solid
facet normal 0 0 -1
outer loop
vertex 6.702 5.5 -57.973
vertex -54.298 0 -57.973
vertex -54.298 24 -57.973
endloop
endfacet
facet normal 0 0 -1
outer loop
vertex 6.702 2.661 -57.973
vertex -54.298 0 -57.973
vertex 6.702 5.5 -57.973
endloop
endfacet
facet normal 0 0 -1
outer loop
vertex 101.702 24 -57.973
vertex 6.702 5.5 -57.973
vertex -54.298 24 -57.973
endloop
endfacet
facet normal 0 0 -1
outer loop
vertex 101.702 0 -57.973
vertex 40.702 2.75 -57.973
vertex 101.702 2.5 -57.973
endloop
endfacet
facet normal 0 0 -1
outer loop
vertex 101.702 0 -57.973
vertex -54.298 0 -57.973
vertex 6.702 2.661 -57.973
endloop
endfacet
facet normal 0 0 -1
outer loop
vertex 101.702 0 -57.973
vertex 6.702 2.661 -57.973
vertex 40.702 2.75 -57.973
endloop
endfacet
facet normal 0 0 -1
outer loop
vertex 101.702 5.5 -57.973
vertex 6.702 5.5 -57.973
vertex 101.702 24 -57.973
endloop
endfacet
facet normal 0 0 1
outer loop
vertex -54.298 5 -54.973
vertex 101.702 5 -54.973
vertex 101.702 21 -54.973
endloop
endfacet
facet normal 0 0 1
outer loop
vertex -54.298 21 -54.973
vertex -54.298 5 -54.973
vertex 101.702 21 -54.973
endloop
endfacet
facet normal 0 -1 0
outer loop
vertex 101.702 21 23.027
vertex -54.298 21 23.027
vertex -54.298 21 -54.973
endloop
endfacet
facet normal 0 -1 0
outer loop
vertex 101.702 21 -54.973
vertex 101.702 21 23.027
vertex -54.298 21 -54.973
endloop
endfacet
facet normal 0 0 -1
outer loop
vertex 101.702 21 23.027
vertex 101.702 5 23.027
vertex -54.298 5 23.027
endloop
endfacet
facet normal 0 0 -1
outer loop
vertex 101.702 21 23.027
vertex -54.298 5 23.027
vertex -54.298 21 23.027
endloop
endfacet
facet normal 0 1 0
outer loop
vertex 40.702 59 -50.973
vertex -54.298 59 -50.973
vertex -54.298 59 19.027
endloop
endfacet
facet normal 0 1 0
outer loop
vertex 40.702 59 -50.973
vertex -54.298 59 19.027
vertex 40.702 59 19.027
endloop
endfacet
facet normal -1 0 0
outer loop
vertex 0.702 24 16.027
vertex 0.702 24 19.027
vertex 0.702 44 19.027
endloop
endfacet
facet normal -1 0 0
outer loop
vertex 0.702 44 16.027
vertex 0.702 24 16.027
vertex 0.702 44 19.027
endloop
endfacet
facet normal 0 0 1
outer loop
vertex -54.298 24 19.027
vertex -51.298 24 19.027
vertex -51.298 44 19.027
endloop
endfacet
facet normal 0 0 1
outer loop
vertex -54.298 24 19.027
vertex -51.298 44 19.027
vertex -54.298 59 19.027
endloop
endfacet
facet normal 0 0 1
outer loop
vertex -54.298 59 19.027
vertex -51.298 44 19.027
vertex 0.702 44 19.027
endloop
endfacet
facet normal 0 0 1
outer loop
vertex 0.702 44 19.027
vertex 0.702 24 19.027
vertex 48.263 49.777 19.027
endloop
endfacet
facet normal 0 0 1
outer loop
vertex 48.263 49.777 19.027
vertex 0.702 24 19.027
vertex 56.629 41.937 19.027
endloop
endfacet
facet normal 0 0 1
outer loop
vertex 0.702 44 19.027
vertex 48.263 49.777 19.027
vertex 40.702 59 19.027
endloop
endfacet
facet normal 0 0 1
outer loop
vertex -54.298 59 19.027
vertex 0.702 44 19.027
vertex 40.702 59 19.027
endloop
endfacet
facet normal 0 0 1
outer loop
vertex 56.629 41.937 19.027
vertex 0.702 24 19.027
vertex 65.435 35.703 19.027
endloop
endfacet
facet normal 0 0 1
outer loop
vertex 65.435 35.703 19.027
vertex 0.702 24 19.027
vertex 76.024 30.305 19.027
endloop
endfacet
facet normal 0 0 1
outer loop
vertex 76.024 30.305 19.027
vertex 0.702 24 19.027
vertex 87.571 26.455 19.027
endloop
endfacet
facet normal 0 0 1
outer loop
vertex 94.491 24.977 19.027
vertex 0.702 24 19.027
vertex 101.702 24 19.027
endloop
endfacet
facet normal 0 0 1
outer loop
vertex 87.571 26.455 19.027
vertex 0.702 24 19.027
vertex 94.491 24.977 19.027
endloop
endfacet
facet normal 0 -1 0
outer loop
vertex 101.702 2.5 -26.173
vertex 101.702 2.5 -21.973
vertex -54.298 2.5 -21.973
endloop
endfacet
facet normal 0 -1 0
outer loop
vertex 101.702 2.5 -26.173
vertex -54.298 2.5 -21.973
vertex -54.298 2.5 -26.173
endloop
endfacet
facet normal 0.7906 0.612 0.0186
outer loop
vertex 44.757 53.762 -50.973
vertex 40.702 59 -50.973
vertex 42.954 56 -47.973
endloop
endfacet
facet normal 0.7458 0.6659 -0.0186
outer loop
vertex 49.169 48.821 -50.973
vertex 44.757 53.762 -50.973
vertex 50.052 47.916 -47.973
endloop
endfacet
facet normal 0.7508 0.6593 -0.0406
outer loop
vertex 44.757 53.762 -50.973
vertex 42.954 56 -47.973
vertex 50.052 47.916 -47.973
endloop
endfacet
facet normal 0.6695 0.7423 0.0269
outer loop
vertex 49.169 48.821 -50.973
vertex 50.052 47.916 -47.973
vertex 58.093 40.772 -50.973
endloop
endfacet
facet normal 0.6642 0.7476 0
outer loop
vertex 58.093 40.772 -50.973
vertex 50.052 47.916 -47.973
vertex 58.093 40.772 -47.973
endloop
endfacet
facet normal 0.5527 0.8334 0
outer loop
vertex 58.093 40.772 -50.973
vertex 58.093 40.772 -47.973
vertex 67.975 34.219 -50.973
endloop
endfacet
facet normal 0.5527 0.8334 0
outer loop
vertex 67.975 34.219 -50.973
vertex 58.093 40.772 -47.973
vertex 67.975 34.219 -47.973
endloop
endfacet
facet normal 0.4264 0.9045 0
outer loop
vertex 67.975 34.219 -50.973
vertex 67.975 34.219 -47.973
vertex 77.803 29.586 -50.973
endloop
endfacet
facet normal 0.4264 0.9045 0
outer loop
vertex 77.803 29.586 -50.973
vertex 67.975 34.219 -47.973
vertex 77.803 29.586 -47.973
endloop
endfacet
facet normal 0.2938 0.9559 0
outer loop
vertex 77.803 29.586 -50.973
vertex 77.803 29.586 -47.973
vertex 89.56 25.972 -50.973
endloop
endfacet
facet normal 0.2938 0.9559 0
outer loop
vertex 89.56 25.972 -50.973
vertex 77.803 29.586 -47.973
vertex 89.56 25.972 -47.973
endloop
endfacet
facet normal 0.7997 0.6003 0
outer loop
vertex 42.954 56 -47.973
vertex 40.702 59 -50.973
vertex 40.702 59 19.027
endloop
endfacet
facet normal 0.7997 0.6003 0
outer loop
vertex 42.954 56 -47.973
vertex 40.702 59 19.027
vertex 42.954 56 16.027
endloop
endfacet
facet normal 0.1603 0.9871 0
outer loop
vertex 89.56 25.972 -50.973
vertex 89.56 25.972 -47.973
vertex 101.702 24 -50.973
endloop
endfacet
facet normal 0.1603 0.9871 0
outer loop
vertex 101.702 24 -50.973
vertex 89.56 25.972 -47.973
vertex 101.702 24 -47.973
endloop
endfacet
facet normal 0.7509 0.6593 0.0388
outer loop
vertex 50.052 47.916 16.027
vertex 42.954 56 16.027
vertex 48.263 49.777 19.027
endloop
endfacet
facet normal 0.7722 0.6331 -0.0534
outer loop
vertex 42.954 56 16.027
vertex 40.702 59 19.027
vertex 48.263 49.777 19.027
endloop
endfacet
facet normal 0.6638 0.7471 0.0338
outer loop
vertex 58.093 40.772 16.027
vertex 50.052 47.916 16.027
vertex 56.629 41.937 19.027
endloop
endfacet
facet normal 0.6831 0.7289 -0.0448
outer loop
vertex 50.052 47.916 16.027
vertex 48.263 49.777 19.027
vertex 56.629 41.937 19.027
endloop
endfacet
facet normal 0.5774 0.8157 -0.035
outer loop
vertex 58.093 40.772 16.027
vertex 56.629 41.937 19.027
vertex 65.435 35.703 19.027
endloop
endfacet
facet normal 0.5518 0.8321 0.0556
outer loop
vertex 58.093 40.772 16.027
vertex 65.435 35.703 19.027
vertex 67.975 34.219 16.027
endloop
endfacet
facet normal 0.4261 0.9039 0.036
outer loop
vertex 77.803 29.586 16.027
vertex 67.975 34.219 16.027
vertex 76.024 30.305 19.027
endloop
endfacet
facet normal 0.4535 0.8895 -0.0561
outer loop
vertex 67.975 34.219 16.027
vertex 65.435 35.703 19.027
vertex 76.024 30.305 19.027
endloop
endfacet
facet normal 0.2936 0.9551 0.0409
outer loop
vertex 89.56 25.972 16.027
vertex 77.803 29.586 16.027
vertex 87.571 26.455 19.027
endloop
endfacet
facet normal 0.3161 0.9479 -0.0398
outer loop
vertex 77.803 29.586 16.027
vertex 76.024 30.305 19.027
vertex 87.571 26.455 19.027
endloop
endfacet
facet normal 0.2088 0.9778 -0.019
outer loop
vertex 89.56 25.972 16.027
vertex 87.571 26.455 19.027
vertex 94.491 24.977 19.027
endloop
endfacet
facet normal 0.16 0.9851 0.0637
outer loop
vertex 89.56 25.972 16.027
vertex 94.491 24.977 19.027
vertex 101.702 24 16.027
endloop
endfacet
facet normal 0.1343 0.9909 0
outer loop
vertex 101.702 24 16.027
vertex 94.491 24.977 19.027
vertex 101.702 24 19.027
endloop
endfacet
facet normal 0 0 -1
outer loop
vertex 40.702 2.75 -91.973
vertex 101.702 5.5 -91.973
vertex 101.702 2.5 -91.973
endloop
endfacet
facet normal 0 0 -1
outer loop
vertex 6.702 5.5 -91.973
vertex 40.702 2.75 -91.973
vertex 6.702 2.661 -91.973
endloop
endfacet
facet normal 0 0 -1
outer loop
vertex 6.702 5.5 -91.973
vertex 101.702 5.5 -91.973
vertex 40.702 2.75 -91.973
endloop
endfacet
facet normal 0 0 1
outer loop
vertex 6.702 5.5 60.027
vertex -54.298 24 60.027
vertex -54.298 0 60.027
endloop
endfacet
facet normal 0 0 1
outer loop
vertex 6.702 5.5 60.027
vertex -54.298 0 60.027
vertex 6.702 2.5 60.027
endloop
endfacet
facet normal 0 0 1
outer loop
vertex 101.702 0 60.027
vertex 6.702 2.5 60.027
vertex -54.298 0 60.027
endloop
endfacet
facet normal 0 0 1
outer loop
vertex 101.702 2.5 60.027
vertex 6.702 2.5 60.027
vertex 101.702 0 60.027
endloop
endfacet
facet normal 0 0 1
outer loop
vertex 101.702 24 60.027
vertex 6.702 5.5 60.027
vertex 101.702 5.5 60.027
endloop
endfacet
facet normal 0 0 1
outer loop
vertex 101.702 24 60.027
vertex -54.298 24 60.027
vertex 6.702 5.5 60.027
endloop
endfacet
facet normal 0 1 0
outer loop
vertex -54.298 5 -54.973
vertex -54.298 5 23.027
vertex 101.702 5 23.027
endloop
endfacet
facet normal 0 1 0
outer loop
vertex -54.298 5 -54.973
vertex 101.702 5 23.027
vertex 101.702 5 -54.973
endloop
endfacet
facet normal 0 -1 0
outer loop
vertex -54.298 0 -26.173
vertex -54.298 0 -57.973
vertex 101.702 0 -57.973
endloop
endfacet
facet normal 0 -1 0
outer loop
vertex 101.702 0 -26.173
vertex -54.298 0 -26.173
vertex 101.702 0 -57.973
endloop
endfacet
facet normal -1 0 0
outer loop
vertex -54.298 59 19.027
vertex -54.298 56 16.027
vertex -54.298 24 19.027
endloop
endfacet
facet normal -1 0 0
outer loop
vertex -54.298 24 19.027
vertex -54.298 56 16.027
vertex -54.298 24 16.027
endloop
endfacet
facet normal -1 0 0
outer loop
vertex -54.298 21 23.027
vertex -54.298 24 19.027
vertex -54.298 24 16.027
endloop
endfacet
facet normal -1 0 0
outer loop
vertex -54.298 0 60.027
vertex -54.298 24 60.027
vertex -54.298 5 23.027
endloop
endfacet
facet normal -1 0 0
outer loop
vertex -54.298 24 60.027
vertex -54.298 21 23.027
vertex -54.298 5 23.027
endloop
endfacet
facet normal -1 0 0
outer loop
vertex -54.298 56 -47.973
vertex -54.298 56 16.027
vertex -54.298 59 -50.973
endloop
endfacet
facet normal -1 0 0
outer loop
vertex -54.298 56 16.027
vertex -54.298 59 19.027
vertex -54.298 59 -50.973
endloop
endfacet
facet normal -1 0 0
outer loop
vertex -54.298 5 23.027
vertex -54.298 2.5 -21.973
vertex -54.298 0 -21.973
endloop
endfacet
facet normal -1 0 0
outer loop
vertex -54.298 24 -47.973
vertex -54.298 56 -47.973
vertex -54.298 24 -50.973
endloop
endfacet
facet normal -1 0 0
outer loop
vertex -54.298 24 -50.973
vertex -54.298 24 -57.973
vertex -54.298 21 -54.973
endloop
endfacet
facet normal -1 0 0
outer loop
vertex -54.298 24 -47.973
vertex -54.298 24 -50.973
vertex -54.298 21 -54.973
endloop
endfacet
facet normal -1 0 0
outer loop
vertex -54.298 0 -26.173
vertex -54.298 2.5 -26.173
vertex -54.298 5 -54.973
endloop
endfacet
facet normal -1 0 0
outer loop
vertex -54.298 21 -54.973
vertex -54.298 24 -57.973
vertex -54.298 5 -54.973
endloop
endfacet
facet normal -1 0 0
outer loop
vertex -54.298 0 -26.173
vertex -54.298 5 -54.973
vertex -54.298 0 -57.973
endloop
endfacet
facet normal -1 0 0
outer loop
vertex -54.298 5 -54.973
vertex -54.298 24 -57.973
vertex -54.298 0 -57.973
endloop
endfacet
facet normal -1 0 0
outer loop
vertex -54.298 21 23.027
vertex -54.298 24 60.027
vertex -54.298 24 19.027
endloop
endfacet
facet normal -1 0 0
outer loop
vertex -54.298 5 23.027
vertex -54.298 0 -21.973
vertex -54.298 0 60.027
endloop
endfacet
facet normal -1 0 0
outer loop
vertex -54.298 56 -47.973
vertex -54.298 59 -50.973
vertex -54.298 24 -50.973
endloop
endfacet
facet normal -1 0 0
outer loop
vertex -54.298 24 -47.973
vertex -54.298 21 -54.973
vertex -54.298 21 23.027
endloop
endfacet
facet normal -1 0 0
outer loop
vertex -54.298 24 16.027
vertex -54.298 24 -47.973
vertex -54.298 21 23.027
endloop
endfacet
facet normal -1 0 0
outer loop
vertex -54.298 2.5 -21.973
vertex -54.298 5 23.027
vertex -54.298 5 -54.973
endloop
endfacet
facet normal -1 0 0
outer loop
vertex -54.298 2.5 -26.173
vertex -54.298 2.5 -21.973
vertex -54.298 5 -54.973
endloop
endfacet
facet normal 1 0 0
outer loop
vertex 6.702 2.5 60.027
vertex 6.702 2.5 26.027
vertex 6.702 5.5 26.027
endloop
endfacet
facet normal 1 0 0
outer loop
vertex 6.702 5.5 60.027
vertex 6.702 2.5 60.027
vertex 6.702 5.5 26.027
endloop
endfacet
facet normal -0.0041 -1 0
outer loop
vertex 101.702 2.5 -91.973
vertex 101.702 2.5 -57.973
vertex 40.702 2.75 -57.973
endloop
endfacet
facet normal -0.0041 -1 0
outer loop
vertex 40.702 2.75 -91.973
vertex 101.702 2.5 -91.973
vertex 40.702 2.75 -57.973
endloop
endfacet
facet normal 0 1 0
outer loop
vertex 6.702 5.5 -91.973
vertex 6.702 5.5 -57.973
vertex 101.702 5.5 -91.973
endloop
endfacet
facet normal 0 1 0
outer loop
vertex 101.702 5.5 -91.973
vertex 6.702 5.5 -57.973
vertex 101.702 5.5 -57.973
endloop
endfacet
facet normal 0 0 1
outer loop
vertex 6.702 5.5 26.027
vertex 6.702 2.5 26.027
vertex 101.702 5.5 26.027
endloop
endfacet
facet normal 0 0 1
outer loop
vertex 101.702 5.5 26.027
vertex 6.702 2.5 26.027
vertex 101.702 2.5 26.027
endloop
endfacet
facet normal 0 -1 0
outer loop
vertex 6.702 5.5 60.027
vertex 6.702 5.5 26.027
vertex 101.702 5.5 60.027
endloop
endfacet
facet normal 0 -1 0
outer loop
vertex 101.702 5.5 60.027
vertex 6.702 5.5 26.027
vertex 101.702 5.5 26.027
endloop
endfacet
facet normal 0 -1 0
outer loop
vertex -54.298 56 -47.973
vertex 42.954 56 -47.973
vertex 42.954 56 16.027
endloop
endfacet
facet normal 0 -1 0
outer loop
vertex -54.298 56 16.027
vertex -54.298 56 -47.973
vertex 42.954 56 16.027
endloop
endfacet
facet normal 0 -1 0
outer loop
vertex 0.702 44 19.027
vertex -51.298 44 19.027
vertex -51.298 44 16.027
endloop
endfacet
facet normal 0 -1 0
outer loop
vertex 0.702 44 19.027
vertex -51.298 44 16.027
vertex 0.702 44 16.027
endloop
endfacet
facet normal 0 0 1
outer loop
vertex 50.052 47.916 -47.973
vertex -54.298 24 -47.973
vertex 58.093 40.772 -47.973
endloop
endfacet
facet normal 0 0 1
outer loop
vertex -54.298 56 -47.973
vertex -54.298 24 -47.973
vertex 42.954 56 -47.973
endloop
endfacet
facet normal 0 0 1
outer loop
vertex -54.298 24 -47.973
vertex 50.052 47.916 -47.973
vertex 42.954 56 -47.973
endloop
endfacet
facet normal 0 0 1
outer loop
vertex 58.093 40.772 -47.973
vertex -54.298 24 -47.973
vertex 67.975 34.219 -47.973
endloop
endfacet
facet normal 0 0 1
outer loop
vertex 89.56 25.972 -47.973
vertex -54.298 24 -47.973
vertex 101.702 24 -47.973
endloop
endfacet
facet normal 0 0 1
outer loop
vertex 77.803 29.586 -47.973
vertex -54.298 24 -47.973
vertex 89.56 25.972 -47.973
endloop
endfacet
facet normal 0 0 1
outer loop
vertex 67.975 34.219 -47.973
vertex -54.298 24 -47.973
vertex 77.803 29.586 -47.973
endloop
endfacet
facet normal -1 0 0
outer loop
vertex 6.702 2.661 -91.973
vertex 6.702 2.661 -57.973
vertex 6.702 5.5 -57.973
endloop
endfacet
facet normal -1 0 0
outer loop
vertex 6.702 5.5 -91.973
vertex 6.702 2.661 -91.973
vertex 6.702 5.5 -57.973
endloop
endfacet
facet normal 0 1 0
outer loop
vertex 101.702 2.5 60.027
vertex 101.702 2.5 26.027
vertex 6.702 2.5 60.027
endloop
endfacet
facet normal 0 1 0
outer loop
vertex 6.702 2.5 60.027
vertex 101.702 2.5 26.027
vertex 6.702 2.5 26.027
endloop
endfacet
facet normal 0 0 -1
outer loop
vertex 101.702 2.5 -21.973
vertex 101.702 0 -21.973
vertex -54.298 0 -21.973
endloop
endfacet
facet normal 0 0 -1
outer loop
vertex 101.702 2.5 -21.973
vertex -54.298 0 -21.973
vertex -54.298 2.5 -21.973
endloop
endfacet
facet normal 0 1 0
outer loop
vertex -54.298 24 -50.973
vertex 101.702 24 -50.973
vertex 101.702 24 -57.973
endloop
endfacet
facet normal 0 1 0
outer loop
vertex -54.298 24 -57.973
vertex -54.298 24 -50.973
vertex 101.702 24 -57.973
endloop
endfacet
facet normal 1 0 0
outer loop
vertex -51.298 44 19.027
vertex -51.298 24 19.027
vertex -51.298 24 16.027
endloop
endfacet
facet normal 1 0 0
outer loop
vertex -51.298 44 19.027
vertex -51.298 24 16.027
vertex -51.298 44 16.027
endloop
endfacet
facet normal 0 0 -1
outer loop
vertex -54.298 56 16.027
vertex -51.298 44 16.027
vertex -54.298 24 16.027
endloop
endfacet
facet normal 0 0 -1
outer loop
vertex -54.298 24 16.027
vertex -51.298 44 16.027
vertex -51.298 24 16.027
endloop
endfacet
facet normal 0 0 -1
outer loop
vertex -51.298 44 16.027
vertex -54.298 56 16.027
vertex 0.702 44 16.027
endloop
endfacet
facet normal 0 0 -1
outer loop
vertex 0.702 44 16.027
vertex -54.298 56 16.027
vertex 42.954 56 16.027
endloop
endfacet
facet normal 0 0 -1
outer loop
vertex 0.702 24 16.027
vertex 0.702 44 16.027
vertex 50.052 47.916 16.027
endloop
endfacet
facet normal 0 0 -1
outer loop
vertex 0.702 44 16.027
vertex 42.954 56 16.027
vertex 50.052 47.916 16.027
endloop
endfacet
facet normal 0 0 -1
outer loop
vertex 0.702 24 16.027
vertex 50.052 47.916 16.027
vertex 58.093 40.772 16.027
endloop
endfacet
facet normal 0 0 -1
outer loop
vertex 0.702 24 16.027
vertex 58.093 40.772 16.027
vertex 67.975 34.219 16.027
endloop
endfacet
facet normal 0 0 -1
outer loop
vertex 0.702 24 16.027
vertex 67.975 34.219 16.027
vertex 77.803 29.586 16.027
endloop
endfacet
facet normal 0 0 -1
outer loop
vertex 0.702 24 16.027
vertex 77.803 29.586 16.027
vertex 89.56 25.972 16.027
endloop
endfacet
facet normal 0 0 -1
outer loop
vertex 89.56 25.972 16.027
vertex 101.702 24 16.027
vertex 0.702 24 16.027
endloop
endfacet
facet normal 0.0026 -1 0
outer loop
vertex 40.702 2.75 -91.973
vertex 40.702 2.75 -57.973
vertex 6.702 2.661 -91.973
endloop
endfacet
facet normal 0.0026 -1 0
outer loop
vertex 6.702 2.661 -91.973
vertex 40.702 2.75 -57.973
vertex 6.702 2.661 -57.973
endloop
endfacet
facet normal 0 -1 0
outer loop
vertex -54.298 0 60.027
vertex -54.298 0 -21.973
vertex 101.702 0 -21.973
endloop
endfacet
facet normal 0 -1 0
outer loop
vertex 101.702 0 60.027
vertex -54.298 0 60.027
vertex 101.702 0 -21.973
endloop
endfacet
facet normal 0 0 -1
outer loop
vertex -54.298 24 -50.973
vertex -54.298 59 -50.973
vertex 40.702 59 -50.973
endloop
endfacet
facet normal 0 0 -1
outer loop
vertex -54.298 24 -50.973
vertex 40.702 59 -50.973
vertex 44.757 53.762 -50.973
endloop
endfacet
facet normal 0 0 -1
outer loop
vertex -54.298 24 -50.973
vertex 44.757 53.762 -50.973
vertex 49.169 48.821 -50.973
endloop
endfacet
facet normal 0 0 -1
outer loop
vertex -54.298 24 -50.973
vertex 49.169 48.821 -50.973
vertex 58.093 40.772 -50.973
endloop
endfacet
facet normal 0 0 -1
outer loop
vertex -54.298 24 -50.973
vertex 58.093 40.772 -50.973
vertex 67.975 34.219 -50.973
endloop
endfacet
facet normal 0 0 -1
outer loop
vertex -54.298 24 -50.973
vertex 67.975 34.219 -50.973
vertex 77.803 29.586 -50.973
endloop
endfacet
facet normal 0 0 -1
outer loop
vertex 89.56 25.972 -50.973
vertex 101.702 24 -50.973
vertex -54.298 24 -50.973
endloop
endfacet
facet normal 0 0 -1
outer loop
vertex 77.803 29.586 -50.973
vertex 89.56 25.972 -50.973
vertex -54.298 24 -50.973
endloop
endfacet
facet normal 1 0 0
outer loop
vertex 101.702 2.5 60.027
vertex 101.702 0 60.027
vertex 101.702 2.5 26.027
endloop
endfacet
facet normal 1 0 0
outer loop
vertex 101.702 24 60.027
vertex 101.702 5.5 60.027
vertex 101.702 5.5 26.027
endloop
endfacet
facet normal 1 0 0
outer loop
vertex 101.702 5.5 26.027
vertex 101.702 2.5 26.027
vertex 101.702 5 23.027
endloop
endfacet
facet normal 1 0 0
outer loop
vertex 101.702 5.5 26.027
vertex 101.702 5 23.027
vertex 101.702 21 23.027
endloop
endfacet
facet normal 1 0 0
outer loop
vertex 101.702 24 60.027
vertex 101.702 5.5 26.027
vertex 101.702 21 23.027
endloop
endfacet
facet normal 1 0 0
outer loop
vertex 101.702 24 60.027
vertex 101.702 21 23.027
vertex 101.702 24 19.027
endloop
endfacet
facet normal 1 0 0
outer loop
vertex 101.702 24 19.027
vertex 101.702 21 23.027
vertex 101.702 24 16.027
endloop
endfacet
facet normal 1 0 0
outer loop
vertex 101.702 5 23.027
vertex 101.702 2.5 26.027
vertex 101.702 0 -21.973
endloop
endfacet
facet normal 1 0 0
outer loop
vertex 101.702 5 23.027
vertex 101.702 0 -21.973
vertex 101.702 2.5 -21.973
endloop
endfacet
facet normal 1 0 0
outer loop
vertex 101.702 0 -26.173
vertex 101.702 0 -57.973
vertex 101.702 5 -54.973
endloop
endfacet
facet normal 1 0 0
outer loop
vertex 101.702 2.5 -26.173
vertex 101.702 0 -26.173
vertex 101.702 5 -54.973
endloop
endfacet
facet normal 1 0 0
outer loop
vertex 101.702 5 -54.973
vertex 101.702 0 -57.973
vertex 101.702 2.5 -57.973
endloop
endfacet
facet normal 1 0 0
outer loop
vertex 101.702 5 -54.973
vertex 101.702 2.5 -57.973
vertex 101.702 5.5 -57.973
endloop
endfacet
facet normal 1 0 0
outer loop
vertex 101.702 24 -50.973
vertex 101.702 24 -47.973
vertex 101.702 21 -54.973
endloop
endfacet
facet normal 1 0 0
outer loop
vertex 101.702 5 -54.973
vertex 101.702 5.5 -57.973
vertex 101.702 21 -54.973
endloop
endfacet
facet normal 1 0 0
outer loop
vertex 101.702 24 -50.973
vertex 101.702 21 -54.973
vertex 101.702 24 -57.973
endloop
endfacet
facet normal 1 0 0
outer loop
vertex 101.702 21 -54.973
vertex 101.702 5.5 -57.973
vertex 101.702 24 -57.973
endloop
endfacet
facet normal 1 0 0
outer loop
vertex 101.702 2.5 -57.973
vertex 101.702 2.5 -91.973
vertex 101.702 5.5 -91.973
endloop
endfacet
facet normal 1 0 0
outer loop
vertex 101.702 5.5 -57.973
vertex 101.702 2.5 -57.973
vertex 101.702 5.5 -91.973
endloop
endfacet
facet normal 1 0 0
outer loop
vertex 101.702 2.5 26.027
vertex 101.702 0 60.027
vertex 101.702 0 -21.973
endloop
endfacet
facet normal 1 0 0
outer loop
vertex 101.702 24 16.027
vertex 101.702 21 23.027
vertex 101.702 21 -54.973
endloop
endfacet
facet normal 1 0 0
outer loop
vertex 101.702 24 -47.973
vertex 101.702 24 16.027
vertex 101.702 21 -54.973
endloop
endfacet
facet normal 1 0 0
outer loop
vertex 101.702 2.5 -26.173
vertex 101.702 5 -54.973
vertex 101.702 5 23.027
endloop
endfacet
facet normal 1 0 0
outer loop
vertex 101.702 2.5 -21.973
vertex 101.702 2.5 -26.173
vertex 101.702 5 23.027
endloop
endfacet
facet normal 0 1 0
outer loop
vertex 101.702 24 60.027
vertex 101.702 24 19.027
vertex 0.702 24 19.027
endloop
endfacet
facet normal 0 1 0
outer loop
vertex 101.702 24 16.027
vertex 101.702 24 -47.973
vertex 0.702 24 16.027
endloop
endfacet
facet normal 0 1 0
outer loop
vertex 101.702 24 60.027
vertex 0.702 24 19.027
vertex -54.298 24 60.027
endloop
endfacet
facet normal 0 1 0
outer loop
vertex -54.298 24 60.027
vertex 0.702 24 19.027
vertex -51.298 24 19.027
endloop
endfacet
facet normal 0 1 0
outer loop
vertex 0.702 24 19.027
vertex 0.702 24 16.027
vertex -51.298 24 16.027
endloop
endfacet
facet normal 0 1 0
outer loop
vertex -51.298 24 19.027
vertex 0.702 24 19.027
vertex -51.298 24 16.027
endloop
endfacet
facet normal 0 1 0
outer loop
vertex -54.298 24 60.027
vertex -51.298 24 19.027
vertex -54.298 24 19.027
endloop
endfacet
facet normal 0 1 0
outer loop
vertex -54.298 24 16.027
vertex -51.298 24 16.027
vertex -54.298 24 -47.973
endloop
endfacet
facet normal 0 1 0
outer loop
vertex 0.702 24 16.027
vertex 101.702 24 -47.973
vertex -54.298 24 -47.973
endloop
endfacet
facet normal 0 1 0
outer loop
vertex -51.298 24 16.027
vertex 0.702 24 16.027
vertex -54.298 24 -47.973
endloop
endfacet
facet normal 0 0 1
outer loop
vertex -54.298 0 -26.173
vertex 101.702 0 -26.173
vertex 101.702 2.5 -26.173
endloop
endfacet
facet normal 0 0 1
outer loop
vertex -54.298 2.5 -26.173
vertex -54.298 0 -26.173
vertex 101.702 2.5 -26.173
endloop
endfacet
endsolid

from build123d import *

# Parameters (mm, degrees)
ESQUISSE1_W             = 156
ESQUISSE1_H             = 84
BOSS_EXTRU_1_DEPTH      = 59
ESQUISSE2_W             = 78
ESQUISSE2_H             = 16
ESQUISSE2_W_2           = 7
ESQUISSE2_H_2           = 35
ESQUISSE2_W_3           = 4.2
ESQUISSE2_H_3           = 2.5
ENL_V_MAT_EXTRU_1_DEPTH = 177.572550515
ENL_V_MAT_EXTRU_3_DEPTH = 141.546285889
ESQUISSE4_W             = 52
ESQUISSE4_H             = 20
ENL_V_MAT_EXTRU_4_DEPTH = 59
BOSS_EXTRU_2_DEPTH      = 34
BOSS_EXTRU_3_DEPTH      = 34


with BuildPart() as part:
    # Esquisse1 → Boss.-Extru.1 (new body)
    with BuildSketch(Plane(origin=(0, 0, 0), x_dir=(1, 0, 0), z_dir=(0, 1, 0))):
        with Locations((23.701811573, 15.972972973)):
            Rectangle(ESQUISSE1_W, ESQUISSE1_H)
    extrude(amount=BOSS_EXTRU_1_DEPTH)

    # Esquisse2 → Enlèv. mat.-Extru.1 (cut, through all)
    with BuildSketch(Plane(origin=(101.701811573, 0, 0), x_dir=(0, 0, -1), z_dir=(1, 0, 0))):
        Polygon((15.972972973, 24), (47.972972973, 24), (47.972972973, 56), (-16.027027027, 56), (-16.027027027, 24), align=None)
        with Locations((15.972972973, 13)):
            Rectangle(ESQUISSE2_W, ESQUISSE2_H)
        with Locations((-22.527027027, 41.5)):
            Rectangle(ESQUISSE2_W_2, ESQUISSE2_H_2)
        Polygon((54.972972973, 24), (57.972972973, 24), (57.972972973, 59), (50.972972973, 59), (50.972972973, 24), align=None)
        with Locations((24.072972973, 1.25)):
            Rectangle(ESQUISSE2_W_3, ESQUISSE2_H_3)
    extrude(amount=-ENL_V_MAT_EXTRU_1_DEPTH, mode=Mode.SUBTRACT)

    # Esquisse3 → Enlèv. mat.-Extru.3 (cut, through all)
    with BuildSketch(Plane.XY.offset(19.027027027)):
        with BuildLine():
            Line((101.701811573, 59), (40.701811573, 59))
            add(Edge.make_bspline(
                [(40.701811573, 59), (63.23269898, 27.796698054), (101.701811573, 24)],
                knots=[0, 0, 0, 1, 1, 1], degree=2))
            Line((101.701811573, 24), (101.701811573, 59))
        make_face()
    extrude(amount=-ENL_V_MAT_EXTRU_3_DEPTH, mode=Mode.SUBTRACT)

    # Esquisse4 → Enlèv. mat.-Extru.4 (cut)
    with BuildSketch(Plane.XY.offset(19.027027027)):
        with Locations((-25.298188427, 34)):
            Rectangle(ESQUISSE4_W, ESQUISSE4_H)
    extrude(amount=-ENL_V_MAT_EXTRU_4_DEPTH, mode=Mode.SUBTRACT)

    # Esquisse5 → Boss.-Extru.2 (add)
    with BuildSketch(Plane(origin=(0, 0, -57.972972973), x_dir=(-1, 0, 0), z_dir=(0, 0, -1))):
        Polygon((-101.701811573, 2.5), (-40.701811573, 2.75), (-40.701811573, 5.5), (-101.701811573, 5.5), align=None)
        Polygon((-40.701811573, 2.75), (-6.701811573, 2.660526316), (-6.701811573, 5.5), (-40.701811573, 5.5), align=None)
    extrude(amount=BOSS_EXTRU_2_DEPTH)

    # Esquisse6 → Boss.-Extru.3 (add)
    with BuildSketch(Plane.XY.offset(26.027027027)):
        Polygon((-54.298188427, 2.5), (-54.298188427, 0), (101.701811573, 0), (101.701811573, 2.5), (6.701811573, 2.5), (6.701811573, 5.5), (101.701811573, 5.5), (101.701811573, 24), (-54.298188427, 24), (-54.298188427, 5.5), align=None)
    extrude(amount=BOSS_EXTRU_3_DEPTH)


solid = part.part
